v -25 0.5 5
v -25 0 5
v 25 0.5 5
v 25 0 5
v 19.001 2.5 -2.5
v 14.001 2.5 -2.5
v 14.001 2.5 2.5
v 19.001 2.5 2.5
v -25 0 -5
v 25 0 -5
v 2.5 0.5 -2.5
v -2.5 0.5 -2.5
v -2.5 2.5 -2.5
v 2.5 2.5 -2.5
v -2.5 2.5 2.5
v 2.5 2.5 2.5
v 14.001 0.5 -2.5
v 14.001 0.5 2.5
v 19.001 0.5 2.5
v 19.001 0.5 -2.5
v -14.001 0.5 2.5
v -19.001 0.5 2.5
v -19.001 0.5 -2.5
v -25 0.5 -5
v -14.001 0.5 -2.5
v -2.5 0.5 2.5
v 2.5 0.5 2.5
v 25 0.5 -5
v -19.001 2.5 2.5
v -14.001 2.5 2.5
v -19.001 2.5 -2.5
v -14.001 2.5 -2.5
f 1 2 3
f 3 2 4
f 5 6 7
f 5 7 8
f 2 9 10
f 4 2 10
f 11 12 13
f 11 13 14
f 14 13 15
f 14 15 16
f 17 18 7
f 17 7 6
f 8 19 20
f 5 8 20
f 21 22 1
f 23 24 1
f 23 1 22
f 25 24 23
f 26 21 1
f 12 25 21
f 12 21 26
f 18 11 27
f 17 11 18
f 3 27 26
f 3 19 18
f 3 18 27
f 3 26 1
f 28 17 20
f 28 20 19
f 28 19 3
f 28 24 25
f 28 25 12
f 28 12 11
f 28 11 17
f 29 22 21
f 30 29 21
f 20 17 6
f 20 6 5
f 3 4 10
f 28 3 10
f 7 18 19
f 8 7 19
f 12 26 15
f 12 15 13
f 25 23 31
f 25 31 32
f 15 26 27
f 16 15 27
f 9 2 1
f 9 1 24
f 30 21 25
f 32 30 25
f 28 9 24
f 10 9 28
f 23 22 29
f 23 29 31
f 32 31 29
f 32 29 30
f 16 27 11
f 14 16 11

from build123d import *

# Parameters (mm, degrees)
SKETCH1_W            = 50
SKETCH1_H            = 10
BOSS_EXTRUDE1_DEPTH  = 0.5
SKETCH12_W           = 5
SKETCH12_H           = 5
BOSS_EXTRUDE8_DEPTH  = 2
SKETCH13_W           = 5
SKETCH13_H           = 5
BOSS_EXTRUDE9_DEPTH  = 2
SKETCH14_W           = 5
SKETCH14_H           = 5
BOSS_EXTRUDE10_DEPTH = 2


with BuildPart() as part:
    # Sketch1 → Boss-Extrude1 (new body)
    with BuildSketch(Plane(origin=(0, 0, 0), x_dir=(1, 0, 0), z_dir=(0, 1, 0))):
        Rectangle(SKETCH1_W, SKETCH1_H)
    extrude(amount=BOSS_EXTRUDE1_DEPTH)

    # Sketch12 → Boss-Extrude8 (add)
    with BuildSketch(Plane(origin=(0, 0.5, 0), x_dir=(1, 0, 0), z_dir=(0, 1, 0))):
        with Locations((-16.500638267, 0)):
            Rectangle(SKETCH12_W, SKETCH12_H)
    extrude(amount=BOSS_EXTRUDE8_DEPTH)

    # Sketch13 → Boss-Extrude9 (add)
    with BuildSketch(Plane(origin=(0, 0.5, 0), x_dir=(1, 0, 0), z_dir=(0, 1, 0))):
        Rectangle(SKETCH13_W, SKETCH13_H)
    extrude(amount=BOSS_EXTRUDE9_DEPTH)

    # Sketch14 → Boss-Extrude10 (add)
    with BuildSketch(Plane(origin=(0, 0.5, 0), x_dir=(1, 0, 0), z_dir=(0, 1, 0))):
        with Locations((16.500638267, 0)):
            Rectangle(SKETCH14_W, SKETCH14_H)
    extrude(amount=BOSS_EXTRUDE10_DEPTH)


solid = part.part
